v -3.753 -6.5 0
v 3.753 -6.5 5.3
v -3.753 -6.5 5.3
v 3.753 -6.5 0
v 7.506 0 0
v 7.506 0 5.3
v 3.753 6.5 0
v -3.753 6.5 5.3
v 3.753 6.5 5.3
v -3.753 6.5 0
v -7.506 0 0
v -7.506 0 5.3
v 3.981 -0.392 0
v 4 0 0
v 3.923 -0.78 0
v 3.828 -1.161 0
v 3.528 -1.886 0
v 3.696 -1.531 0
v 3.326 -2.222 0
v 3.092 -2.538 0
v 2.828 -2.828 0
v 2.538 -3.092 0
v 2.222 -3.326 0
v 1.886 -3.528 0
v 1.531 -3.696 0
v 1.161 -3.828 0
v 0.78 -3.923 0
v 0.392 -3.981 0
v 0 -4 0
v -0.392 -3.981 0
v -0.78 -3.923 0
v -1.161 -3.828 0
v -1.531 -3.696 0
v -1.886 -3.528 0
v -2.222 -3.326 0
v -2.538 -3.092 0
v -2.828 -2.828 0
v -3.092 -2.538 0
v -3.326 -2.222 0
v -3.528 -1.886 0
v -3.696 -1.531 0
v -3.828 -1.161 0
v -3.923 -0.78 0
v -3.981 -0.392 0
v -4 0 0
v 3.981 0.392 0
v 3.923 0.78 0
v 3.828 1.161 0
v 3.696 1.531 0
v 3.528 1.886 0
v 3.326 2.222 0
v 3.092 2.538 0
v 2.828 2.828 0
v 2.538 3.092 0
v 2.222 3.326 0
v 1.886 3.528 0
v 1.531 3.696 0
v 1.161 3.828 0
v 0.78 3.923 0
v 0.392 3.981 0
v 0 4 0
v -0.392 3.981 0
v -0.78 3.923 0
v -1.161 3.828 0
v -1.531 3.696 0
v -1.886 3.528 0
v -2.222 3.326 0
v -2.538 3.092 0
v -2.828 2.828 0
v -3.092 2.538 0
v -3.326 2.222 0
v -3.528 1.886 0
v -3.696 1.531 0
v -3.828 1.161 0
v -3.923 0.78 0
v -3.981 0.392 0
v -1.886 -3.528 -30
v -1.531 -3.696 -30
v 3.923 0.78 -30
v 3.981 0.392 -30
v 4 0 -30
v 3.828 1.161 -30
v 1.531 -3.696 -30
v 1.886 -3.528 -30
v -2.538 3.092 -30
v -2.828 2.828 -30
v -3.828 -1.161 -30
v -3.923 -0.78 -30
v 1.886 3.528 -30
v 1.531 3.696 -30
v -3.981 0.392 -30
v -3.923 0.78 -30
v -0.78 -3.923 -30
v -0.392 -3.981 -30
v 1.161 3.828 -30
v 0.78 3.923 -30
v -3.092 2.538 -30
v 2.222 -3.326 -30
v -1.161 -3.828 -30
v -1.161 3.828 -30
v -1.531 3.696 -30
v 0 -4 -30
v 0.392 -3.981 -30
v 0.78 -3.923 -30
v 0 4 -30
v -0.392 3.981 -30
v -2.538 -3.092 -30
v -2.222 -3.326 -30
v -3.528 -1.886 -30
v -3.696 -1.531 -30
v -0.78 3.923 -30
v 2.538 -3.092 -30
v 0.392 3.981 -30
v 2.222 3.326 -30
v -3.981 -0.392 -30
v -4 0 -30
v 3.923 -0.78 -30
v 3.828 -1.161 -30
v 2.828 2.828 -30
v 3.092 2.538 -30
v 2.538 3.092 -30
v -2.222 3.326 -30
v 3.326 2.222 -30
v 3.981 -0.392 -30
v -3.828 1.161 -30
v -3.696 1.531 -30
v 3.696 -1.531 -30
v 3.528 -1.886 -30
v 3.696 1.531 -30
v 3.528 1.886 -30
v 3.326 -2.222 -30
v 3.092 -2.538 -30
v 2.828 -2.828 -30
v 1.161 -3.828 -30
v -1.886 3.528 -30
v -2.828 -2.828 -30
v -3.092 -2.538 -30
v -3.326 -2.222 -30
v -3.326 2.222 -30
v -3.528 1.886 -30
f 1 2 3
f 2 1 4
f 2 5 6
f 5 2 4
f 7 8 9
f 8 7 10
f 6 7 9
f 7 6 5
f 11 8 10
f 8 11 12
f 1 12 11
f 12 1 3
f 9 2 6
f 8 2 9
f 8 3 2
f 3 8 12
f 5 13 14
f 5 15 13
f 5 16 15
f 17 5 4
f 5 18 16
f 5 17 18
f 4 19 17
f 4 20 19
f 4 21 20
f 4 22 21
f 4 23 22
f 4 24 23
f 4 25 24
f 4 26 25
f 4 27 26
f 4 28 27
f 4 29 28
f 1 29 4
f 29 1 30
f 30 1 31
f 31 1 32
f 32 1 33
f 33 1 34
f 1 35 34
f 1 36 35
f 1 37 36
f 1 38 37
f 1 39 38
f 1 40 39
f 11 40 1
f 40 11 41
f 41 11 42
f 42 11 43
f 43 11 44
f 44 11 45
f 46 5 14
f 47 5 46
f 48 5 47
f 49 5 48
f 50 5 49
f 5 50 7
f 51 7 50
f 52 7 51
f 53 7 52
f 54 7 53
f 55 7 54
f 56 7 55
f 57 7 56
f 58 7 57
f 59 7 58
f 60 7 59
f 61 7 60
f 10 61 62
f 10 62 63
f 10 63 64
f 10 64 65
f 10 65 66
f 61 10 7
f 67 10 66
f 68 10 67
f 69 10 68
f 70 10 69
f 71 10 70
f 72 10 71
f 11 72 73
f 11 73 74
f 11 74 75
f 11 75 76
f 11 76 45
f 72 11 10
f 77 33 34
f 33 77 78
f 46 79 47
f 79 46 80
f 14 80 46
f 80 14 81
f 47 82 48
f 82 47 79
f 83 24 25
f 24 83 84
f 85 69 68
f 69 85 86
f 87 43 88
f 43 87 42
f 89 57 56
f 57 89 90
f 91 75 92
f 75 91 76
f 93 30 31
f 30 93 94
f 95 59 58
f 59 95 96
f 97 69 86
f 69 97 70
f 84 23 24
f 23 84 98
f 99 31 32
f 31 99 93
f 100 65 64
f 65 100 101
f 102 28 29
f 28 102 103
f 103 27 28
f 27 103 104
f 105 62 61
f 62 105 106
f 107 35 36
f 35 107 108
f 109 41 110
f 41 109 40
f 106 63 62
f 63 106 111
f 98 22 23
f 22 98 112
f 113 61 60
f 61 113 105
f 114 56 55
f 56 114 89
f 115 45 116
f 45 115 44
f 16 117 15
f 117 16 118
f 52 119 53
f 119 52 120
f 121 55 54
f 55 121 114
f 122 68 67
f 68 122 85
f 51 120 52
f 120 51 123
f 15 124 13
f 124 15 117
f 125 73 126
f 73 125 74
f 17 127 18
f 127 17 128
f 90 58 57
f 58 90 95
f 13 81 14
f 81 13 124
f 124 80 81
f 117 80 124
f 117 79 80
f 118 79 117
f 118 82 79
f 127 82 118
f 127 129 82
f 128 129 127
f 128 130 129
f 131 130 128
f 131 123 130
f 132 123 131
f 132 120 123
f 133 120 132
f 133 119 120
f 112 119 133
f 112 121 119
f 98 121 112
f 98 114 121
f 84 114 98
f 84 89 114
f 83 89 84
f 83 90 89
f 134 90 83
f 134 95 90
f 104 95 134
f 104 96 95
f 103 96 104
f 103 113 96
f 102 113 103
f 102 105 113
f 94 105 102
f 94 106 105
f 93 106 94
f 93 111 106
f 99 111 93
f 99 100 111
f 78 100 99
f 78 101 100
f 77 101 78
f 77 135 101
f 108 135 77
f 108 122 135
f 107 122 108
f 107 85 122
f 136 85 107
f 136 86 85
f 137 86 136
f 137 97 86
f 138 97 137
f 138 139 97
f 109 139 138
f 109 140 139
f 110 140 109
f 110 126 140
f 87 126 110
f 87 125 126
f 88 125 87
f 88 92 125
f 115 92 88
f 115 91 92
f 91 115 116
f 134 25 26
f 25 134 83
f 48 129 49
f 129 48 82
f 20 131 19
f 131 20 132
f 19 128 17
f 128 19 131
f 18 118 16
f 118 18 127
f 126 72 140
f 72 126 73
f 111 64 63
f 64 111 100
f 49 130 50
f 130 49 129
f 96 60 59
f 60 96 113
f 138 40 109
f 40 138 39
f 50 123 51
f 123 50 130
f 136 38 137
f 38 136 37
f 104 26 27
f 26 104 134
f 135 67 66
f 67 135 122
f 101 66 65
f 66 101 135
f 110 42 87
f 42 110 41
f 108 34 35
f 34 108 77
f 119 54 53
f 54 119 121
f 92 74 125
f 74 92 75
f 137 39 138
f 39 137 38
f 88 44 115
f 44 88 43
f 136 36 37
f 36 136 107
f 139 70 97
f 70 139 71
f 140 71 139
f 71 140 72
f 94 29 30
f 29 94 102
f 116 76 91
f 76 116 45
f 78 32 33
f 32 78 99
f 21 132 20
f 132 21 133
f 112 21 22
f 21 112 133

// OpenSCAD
$fn = 64;

module m8_hex_bolt() {
    union() {
        // Head: hexagonal prism, across-flats 13mm, height 5.3mm
        // In OpenSCAD, cylinder(..., $fn=6) is inscribed in the circumscribed circle,
        // so the radius must be set from across-flats.
        translate([0, 0, 0])
            cylinder(h = 5.3, r = 13 / (2 * cos(30)), $fn = 6);

        // Shank: cylindrical shaft, diameter 8mm, length 30mm
        // Head bottom at z=0, shank extends toward negative Z.
        translate([0, 0, -30])
            cylinder(h = 30, d = 8);
    }
}

m8_hex_bolt();
